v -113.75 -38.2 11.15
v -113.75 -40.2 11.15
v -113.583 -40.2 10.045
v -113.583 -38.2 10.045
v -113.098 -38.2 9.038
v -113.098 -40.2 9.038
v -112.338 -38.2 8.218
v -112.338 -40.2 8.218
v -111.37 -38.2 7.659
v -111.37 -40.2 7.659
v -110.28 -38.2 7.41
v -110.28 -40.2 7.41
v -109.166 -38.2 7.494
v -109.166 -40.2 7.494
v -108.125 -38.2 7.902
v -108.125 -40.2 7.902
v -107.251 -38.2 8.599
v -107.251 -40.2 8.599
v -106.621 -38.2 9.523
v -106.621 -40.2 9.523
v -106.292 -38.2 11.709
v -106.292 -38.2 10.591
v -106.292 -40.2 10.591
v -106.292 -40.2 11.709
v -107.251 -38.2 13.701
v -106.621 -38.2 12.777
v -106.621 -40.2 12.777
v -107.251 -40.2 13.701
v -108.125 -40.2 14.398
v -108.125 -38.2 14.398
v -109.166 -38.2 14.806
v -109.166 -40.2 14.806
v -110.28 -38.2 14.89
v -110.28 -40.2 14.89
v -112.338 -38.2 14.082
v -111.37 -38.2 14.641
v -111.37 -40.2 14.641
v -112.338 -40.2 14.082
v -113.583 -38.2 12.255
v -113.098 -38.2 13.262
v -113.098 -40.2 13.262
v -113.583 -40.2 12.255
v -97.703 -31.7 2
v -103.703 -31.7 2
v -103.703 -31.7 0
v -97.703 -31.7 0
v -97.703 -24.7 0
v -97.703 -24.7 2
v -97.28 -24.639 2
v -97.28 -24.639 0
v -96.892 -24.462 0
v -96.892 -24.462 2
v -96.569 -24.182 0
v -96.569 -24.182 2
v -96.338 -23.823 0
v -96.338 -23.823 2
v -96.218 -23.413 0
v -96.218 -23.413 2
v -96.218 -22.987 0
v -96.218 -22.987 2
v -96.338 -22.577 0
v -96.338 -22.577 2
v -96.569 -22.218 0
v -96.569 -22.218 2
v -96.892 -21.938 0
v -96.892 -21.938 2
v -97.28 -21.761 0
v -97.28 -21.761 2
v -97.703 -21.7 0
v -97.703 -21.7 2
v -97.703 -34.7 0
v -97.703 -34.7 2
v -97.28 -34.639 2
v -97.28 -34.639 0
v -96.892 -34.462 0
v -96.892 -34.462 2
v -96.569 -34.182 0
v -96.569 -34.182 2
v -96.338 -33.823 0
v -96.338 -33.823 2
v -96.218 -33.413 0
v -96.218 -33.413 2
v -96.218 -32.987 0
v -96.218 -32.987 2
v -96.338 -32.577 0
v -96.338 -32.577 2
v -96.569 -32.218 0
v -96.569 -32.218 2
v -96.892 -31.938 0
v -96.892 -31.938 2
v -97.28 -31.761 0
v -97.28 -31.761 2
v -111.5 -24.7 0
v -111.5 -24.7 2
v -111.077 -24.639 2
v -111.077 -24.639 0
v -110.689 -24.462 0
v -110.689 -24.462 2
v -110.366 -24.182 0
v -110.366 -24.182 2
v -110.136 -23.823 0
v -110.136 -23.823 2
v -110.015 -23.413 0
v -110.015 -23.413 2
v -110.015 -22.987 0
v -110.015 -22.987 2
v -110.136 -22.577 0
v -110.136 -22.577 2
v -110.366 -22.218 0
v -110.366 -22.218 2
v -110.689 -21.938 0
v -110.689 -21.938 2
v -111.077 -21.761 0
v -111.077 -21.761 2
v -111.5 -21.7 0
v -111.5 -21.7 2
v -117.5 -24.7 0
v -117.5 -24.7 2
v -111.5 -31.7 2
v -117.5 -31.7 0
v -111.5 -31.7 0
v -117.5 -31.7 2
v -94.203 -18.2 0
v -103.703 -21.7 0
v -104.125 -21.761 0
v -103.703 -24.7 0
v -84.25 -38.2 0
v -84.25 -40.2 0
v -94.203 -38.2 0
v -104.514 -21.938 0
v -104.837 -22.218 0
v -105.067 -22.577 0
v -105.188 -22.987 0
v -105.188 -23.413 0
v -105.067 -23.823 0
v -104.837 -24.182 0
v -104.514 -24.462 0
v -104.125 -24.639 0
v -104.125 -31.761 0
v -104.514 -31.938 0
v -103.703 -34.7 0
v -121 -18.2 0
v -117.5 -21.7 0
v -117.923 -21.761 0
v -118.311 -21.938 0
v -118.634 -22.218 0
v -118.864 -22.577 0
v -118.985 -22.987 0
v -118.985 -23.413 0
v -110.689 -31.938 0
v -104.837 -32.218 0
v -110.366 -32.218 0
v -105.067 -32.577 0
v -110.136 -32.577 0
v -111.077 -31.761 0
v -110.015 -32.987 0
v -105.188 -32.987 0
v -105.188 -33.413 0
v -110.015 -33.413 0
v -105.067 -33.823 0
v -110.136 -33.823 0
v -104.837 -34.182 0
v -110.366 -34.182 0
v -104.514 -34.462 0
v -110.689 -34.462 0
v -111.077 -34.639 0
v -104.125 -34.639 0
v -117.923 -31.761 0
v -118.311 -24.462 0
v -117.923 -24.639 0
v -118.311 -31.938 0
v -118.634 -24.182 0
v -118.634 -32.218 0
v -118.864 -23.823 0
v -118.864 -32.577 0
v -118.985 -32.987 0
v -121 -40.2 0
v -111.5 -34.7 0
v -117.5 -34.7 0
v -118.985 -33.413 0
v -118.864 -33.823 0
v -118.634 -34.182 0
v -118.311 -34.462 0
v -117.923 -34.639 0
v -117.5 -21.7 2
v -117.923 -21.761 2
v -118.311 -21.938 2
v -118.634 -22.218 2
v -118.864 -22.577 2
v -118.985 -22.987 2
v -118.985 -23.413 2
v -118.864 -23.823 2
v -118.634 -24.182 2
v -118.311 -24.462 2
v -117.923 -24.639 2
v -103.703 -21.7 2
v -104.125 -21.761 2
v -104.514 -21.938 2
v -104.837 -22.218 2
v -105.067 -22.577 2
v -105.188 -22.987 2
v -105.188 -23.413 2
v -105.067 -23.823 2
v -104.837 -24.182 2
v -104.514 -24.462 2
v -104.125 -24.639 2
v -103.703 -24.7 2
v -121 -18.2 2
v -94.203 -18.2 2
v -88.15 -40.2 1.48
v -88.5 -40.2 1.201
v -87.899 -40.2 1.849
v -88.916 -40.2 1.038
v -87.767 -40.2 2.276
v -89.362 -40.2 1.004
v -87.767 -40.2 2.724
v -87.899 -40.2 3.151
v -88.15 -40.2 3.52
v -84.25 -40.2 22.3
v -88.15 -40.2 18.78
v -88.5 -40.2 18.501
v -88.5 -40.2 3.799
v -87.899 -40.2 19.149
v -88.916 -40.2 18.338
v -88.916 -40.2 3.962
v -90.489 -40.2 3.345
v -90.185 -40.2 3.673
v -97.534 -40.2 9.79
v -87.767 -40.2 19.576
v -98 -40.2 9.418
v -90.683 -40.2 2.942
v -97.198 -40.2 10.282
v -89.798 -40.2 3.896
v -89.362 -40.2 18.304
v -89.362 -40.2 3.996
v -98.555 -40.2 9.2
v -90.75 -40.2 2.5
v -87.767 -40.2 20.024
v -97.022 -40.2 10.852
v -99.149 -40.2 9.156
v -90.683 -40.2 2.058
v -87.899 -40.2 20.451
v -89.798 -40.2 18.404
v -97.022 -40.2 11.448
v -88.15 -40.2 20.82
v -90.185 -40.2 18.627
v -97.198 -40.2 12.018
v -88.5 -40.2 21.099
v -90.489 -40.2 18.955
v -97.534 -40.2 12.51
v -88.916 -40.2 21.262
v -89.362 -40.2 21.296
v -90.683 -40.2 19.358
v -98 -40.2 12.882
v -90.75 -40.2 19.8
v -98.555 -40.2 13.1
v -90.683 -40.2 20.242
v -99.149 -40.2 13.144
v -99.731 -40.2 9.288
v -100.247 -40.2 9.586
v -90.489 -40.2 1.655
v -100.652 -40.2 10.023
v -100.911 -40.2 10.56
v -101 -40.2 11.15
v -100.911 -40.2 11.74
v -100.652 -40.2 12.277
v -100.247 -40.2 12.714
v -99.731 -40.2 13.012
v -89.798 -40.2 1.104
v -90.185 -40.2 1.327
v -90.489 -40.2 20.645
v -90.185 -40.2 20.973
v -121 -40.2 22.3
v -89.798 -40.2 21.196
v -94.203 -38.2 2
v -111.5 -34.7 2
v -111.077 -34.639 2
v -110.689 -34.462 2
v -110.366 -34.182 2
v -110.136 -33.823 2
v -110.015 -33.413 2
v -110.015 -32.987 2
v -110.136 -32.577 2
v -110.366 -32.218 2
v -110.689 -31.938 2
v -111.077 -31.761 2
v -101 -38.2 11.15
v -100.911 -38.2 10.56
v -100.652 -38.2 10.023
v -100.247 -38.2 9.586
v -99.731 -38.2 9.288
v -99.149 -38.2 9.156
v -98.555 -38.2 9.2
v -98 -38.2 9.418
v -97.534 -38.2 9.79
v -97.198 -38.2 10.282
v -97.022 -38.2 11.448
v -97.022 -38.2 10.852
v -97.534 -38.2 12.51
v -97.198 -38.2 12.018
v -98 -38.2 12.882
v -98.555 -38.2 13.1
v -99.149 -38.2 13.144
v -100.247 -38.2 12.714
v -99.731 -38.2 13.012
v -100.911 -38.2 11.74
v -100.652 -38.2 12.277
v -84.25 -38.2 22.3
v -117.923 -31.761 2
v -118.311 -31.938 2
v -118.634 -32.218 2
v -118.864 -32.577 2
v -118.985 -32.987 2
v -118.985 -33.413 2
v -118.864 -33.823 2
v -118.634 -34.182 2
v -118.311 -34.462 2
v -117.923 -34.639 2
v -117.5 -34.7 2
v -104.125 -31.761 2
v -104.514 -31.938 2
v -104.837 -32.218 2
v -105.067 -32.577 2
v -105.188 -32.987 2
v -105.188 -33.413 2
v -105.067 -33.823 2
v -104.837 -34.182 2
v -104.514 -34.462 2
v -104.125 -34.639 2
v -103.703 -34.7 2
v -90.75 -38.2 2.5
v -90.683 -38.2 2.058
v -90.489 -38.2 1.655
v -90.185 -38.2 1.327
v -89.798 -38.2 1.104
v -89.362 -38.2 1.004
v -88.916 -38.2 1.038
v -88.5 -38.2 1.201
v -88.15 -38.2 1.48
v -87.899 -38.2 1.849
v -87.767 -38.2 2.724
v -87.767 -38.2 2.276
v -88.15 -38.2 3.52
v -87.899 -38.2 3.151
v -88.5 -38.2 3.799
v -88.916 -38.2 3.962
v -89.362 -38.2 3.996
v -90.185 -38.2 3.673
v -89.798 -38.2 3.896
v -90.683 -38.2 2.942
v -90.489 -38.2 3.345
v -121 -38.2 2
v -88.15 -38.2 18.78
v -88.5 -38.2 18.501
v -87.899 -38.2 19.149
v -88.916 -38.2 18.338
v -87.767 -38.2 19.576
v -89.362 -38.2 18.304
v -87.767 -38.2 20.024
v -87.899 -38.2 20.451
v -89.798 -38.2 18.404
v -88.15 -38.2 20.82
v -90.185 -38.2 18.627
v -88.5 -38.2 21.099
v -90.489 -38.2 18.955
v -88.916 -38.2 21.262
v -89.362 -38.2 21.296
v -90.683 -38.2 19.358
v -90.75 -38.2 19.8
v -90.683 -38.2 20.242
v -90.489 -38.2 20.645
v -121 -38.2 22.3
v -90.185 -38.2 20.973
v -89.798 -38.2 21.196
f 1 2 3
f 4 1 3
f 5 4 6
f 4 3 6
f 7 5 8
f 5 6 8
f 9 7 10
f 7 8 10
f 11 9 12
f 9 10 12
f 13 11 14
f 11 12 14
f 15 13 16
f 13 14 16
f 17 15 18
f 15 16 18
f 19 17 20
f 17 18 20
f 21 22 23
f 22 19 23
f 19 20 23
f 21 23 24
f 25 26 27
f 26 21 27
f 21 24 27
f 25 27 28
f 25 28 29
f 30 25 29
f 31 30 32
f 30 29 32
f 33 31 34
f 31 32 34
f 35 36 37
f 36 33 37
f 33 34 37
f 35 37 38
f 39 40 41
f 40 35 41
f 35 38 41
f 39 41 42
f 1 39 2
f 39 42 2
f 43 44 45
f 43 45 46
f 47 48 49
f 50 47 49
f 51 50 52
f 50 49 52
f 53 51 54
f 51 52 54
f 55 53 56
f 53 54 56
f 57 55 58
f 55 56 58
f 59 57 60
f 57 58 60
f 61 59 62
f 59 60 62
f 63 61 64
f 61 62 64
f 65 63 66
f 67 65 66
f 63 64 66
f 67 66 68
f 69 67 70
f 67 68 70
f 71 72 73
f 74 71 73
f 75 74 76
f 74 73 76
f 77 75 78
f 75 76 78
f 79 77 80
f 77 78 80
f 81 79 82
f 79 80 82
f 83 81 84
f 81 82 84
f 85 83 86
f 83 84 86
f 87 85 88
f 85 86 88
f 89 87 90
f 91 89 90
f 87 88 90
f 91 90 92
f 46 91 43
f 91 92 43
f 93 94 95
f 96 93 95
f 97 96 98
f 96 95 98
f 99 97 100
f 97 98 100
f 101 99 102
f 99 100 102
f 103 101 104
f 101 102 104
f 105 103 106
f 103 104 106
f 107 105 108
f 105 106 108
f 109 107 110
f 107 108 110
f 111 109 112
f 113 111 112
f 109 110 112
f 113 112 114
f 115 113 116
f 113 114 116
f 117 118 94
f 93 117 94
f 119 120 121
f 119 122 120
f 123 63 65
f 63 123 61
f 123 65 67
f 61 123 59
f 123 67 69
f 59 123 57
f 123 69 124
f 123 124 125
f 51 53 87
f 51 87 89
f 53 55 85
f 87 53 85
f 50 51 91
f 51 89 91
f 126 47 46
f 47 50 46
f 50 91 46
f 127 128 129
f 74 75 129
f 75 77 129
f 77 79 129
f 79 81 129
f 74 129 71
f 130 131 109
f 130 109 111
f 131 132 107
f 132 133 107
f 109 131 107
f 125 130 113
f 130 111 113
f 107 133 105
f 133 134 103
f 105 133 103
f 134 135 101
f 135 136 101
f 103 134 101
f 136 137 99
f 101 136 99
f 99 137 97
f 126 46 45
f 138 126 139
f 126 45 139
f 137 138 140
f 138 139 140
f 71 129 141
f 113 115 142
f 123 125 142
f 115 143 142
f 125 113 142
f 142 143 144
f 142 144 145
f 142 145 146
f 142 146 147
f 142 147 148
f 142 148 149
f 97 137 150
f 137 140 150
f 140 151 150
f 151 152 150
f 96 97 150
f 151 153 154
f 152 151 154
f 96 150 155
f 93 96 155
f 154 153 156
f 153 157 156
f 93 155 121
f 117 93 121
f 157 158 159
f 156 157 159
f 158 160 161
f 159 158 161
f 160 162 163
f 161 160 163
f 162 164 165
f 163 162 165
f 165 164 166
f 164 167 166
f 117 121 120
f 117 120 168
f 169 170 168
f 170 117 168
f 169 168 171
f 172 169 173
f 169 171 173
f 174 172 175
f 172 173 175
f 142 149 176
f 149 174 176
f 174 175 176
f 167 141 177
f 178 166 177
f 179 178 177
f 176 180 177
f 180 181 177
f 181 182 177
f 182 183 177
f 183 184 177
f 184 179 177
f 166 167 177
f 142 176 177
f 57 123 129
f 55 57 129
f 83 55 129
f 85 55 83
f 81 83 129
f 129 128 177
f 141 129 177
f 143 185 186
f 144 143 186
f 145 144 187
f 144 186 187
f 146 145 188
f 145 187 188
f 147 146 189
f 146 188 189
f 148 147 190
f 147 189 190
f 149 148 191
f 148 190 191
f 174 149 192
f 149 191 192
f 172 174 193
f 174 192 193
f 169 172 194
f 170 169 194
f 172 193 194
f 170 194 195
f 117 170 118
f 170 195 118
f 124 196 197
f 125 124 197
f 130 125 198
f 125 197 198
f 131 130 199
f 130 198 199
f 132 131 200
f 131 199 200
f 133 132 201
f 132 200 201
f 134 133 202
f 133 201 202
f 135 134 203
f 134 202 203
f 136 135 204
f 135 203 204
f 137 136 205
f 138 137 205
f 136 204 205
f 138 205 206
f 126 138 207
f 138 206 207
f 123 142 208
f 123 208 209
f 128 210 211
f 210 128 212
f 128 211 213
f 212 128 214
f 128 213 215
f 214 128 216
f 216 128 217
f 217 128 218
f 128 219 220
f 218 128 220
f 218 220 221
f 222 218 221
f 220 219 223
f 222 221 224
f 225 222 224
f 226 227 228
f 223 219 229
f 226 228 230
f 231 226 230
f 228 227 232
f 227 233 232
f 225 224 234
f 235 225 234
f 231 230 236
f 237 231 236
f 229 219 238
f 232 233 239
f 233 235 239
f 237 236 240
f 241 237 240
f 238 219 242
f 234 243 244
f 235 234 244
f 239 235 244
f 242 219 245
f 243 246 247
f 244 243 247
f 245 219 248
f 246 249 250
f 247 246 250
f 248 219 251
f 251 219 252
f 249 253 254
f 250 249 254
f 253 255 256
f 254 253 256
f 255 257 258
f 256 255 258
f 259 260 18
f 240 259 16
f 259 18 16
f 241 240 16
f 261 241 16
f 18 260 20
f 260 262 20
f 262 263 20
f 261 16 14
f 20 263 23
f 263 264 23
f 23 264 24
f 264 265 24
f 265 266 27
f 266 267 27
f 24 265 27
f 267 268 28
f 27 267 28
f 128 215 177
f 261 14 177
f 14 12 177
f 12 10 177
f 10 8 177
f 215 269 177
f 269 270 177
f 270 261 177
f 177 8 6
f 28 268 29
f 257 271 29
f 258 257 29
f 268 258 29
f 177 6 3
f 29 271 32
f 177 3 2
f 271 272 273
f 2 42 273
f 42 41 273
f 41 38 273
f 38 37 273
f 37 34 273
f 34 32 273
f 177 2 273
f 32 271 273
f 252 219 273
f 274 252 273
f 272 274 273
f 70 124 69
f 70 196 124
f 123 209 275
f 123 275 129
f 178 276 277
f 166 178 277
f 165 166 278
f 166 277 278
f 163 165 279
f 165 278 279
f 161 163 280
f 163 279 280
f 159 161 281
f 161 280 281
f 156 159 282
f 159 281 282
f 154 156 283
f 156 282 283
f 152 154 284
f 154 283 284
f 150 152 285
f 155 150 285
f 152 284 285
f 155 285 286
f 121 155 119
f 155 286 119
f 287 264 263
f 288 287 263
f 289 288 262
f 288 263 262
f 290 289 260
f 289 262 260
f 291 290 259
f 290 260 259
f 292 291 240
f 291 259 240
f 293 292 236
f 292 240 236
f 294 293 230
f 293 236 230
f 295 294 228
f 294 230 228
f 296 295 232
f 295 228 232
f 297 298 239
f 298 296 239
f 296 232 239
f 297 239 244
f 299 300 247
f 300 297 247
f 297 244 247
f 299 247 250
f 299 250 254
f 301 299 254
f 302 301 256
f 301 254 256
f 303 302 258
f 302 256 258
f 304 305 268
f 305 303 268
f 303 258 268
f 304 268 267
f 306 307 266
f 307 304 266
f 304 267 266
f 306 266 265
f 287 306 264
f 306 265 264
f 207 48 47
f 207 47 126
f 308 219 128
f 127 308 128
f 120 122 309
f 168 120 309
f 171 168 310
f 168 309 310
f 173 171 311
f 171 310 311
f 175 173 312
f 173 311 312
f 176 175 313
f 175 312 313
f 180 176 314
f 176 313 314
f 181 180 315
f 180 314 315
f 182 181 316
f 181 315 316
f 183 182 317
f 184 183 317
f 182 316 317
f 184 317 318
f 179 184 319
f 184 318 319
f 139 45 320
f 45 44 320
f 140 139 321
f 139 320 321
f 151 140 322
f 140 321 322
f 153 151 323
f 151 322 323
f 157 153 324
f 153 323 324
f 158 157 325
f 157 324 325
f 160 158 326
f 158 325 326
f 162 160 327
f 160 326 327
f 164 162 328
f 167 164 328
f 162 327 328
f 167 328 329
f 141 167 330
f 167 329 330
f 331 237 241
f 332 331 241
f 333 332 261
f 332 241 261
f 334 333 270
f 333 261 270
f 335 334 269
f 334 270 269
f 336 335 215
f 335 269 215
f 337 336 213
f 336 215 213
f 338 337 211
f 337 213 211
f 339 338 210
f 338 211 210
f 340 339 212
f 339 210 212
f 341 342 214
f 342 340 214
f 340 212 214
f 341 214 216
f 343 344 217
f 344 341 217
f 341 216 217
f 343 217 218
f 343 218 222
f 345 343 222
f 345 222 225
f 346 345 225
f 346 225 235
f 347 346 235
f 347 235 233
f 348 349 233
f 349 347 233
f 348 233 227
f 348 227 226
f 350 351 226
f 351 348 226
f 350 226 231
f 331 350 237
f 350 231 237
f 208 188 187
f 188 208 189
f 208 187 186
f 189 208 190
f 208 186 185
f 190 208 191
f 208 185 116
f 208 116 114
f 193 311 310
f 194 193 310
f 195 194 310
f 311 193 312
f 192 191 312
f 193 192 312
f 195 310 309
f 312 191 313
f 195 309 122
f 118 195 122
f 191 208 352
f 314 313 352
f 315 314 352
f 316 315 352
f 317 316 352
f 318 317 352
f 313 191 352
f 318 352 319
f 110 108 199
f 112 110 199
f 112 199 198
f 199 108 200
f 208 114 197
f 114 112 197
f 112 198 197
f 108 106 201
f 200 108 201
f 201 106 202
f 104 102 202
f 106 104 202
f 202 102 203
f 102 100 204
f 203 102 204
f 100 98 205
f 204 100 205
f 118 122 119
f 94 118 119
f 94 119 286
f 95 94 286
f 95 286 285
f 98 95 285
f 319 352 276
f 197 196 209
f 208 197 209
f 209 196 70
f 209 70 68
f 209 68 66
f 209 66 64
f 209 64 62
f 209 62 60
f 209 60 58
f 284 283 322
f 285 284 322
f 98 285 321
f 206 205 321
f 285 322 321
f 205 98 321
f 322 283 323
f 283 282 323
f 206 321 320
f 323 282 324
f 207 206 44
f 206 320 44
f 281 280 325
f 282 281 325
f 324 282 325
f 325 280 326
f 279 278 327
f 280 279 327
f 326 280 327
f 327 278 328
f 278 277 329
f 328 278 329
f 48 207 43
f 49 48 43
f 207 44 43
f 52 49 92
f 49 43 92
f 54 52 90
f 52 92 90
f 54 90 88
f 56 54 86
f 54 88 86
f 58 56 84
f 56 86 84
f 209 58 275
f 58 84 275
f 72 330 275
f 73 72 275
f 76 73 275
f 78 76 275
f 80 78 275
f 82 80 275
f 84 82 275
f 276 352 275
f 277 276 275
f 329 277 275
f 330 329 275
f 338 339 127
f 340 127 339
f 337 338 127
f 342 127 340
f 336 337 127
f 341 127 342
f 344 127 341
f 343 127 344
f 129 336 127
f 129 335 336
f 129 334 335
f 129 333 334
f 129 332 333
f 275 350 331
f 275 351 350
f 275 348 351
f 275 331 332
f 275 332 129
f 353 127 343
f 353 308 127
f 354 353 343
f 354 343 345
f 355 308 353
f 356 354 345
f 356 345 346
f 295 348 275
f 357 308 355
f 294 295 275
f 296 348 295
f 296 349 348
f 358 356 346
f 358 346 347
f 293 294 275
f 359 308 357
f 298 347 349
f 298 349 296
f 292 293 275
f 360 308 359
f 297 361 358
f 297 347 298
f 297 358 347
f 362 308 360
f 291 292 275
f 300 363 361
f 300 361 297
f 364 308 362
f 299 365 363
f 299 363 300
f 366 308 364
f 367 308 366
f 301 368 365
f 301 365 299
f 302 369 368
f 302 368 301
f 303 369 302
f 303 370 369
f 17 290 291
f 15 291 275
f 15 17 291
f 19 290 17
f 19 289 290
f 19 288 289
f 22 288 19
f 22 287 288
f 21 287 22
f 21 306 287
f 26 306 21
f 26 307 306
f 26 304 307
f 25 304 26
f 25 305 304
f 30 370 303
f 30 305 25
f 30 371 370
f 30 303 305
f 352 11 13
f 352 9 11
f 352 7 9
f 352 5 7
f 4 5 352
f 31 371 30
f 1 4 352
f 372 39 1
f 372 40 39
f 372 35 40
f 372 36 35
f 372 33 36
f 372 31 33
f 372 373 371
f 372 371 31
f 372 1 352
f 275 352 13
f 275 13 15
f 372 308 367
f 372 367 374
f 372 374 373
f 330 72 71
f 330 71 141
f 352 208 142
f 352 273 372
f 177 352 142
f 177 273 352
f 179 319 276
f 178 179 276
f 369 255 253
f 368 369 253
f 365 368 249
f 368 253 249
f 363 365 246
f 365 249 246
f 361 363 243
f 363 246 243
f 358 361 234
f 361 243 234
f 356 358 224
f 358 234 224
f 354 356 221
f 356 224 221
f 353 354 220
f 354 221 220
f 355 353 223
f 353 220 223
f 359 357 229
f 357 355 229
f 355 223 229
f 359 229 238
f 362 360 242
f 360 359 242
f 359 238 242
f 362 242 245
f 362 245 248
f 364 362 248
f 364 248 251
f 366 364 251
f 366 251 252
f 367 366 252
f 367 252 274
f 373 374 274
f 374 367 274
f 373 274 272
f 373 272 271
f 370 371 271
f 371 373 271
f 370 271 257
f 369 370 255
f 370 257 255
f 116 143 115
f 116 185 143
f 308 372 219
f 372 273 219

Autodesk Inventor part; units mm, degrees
ref_plane "YZ Plane" through (0, 0, 0) normal (1, 0, 0) x (0, 1, 0)
ref_plane "XZ Plane" through (0, 0, 0) normal (0, 1, 0) x (-1, 0, 0)
ref_plane "XY Plane" through (0, 0, 0) normal (0, 0, 1) x (1, 0, 0)
ref_plane "Work Plane2" through (-101.9029, -40.2, 5.7831) normal (0, 1, 0) x (-1, 0, 0)
sketch "Sketch2" plane through (-101.9029, -40.2, 5.7831) normal (0, 1, 0) x (-1, 0, 0)
  circle A0 centre (8.0971, 5.3669) radius 3.75
  circle A1 centre (-2.9029, 5.3669) radius 2
  circle A2 centre (-12.6529, 14.0169) radius 1.5
  circle A3 centre (-12.6529, -3.2831) radius 1.5
  line L0 (-17.6529, 16.5169) -> (-17.6529, -5.7831)
  line L1 (-17.6529, -5.7831) -> (14.5971, -5.7831)
  line L2 (19.0971, -1.2831) -> (19.0971, 12.0169)
  line L3 (14.5971, 16.5169) -> (-17.6529, 16.5169)
  line L4 (-17.6529, 16.5169) -> (19.0971, 16.5169)
  line L5 (19.0971, 16.5169) -> (19.0971, -5.7831)
  line L6 (19.0971, -5.7831) -> (-17.6529, -5.7831)
  line L7 (-17.6529, -5.7831) -> (-17.6529, 16.5169)
  point P0 (-101.9029, -5.7831)
  point P1 (14.5971, -5.7831)
  point P2 (19.0971, -1.2831)
  point P3 (19.0971, 12.0169)
extrude "Extrusion2" add sketch "Sketch2" along normal blind 2
sketch "Sketch3" plane through (-101.9029, -38.2, 5.7831) normal (0, 1, 0) x (1, 0, 0)
  line L0 (17.6529, 5.7831) -> (-19.0971, 5.7831) projected
  line L1 (12.7, 3.175) -> (7.7, 3.175)
  line L2 (7.7, 3.175) -> (7.7, 5.7831)
  line L3 (7.7, 5.7831) -> (12.7, 5.7831)
  line L4 (12.7, 5.7831) -> (12.7, 3.175)
  line L5 (7.7, 5.7831) -> (-19.0971, 5.7831)
  line L6 (-19.0971, 5.7831) -> (-19.0971, 3.7831)
  line L7 (-19.0971, 3.7831) -> (7.7, 3.7831)
  line L8 (7.7, 3.7831) -> (7.7, 5.7831)
  point P0 (101.9029, 5.7831)
  point P1 (-14.5971, 5.7831)
  point P2 (7.7, 3.7831)
  dimension "d4" = 5
  dimension "d5" = 2
extrude "Extrusion3" add sketch "Sketch3" along normal blind 20 contours L2 L7 L6 L0
sketch "Sketch4" plane through (-121, -38.2, 2) normal (0, 0, 1) x (1, 0, 0)
  line L0 (26.7971, 0) -> (0, 0) projected
  line L1 (26.7971, 0) -> (26.7971, 20) projected
  line L2 (0, 20) -> (26.7971, 20) projected
  line L3 (0, 0) -> (0, 20) projected
  line L4 (18.7971, 16.5) -> (21.7971, 16.5)
  line L5 (18.7971, 16.5) -> (23.2971, 16.5)
  line L6 (23.2971, 13.5) -> (18.7971, 13.5)
  line L7 (18.7971, 3.5) -> (23.2971, 3.5)
  line L8 (23.2971, 6.5) -> (18.7971, 6.5)
  line L9 (3.5, 16.5) -> (5, 16.5)
  line L10 (3.5, 16.5) -> (8, 16.5)
  line L11 (8, 13.5) -> (3.5, 13.5)
  line L12 (3.5, 6.5) -> (5, 6.5)
  line L13 (3.5, 6.5) -> (8, 6.5)
  line L14 (8, 3.5) -> (3.5, 3.5)
  line L15 (18.7971, 3.5) -> (17.2971, 3.5)
  line L16 (17.2971, 6.5) -> (18.7971, 6.5)
  line L17 (8, 3.5) -> (9.5, 3.5)
  line L18 (9.5, 6.5) -> (8, 6.5)
  line L19 (18.7971, 13.5) -> (17.2971, 13.5)
  line L20 (17.2971, 16.5) -> (18.7971, 16.5)
  line L21 (8, 13.5) -> (9.5, 13.5)
  line L22 (9.5, 16.5) -> (8, 16.5)
  arc A0 (3.5, 6.5) -> (3.5, 3.5) centre (3.5, 5) ccw
  arc A1 (9.5, 3.5) -> (9.5, 6.5) centre (9.5, 5) ccw
  arc A2 (17.2971, 6.5) -> (17.2971, 3.5) centre (17.2971, 5) ccw
  arc A3 (23.2971, 3.5) -> (23.2971, 6.5) centre (23.2971, 5) ccw
  arc A4 (23.2971, 13.5) -> (23.2971, 16.5) centre (23.2971, 15) ccw
  arc A5 (17.2971, 16.5) -> (17.2971, 13.5) centre (17.2971, 15) ccw
  arc A6 (9.5, 13.5) -> (9.5, 16.5) centre (9.5, 15) ccw
  arc A7 (3.5, 16.5) -> (3.5, 13.5) centre (3.5, 15) ccw
  point P0 (121, 38.2)
  point P1 (18.7971, 6.5)
  point P2 (8, 6.5)
  point P3 (5, 6.5)
  point P4 (8, 16.5)
  point P5 (18.7971, 16.5)
extrude "Extrusion4" cut sketch "Sketch4" against normal through all contours L4 L5 A4 L6 L19 A5 L20 | L15 A2 L16 L8 A3 L7 | L9 L10 L22 A6 L21 L11 A7 | L12 L13 L18 A1 L17 L14 A0
properties part number "suporte_motor_amarelo"
